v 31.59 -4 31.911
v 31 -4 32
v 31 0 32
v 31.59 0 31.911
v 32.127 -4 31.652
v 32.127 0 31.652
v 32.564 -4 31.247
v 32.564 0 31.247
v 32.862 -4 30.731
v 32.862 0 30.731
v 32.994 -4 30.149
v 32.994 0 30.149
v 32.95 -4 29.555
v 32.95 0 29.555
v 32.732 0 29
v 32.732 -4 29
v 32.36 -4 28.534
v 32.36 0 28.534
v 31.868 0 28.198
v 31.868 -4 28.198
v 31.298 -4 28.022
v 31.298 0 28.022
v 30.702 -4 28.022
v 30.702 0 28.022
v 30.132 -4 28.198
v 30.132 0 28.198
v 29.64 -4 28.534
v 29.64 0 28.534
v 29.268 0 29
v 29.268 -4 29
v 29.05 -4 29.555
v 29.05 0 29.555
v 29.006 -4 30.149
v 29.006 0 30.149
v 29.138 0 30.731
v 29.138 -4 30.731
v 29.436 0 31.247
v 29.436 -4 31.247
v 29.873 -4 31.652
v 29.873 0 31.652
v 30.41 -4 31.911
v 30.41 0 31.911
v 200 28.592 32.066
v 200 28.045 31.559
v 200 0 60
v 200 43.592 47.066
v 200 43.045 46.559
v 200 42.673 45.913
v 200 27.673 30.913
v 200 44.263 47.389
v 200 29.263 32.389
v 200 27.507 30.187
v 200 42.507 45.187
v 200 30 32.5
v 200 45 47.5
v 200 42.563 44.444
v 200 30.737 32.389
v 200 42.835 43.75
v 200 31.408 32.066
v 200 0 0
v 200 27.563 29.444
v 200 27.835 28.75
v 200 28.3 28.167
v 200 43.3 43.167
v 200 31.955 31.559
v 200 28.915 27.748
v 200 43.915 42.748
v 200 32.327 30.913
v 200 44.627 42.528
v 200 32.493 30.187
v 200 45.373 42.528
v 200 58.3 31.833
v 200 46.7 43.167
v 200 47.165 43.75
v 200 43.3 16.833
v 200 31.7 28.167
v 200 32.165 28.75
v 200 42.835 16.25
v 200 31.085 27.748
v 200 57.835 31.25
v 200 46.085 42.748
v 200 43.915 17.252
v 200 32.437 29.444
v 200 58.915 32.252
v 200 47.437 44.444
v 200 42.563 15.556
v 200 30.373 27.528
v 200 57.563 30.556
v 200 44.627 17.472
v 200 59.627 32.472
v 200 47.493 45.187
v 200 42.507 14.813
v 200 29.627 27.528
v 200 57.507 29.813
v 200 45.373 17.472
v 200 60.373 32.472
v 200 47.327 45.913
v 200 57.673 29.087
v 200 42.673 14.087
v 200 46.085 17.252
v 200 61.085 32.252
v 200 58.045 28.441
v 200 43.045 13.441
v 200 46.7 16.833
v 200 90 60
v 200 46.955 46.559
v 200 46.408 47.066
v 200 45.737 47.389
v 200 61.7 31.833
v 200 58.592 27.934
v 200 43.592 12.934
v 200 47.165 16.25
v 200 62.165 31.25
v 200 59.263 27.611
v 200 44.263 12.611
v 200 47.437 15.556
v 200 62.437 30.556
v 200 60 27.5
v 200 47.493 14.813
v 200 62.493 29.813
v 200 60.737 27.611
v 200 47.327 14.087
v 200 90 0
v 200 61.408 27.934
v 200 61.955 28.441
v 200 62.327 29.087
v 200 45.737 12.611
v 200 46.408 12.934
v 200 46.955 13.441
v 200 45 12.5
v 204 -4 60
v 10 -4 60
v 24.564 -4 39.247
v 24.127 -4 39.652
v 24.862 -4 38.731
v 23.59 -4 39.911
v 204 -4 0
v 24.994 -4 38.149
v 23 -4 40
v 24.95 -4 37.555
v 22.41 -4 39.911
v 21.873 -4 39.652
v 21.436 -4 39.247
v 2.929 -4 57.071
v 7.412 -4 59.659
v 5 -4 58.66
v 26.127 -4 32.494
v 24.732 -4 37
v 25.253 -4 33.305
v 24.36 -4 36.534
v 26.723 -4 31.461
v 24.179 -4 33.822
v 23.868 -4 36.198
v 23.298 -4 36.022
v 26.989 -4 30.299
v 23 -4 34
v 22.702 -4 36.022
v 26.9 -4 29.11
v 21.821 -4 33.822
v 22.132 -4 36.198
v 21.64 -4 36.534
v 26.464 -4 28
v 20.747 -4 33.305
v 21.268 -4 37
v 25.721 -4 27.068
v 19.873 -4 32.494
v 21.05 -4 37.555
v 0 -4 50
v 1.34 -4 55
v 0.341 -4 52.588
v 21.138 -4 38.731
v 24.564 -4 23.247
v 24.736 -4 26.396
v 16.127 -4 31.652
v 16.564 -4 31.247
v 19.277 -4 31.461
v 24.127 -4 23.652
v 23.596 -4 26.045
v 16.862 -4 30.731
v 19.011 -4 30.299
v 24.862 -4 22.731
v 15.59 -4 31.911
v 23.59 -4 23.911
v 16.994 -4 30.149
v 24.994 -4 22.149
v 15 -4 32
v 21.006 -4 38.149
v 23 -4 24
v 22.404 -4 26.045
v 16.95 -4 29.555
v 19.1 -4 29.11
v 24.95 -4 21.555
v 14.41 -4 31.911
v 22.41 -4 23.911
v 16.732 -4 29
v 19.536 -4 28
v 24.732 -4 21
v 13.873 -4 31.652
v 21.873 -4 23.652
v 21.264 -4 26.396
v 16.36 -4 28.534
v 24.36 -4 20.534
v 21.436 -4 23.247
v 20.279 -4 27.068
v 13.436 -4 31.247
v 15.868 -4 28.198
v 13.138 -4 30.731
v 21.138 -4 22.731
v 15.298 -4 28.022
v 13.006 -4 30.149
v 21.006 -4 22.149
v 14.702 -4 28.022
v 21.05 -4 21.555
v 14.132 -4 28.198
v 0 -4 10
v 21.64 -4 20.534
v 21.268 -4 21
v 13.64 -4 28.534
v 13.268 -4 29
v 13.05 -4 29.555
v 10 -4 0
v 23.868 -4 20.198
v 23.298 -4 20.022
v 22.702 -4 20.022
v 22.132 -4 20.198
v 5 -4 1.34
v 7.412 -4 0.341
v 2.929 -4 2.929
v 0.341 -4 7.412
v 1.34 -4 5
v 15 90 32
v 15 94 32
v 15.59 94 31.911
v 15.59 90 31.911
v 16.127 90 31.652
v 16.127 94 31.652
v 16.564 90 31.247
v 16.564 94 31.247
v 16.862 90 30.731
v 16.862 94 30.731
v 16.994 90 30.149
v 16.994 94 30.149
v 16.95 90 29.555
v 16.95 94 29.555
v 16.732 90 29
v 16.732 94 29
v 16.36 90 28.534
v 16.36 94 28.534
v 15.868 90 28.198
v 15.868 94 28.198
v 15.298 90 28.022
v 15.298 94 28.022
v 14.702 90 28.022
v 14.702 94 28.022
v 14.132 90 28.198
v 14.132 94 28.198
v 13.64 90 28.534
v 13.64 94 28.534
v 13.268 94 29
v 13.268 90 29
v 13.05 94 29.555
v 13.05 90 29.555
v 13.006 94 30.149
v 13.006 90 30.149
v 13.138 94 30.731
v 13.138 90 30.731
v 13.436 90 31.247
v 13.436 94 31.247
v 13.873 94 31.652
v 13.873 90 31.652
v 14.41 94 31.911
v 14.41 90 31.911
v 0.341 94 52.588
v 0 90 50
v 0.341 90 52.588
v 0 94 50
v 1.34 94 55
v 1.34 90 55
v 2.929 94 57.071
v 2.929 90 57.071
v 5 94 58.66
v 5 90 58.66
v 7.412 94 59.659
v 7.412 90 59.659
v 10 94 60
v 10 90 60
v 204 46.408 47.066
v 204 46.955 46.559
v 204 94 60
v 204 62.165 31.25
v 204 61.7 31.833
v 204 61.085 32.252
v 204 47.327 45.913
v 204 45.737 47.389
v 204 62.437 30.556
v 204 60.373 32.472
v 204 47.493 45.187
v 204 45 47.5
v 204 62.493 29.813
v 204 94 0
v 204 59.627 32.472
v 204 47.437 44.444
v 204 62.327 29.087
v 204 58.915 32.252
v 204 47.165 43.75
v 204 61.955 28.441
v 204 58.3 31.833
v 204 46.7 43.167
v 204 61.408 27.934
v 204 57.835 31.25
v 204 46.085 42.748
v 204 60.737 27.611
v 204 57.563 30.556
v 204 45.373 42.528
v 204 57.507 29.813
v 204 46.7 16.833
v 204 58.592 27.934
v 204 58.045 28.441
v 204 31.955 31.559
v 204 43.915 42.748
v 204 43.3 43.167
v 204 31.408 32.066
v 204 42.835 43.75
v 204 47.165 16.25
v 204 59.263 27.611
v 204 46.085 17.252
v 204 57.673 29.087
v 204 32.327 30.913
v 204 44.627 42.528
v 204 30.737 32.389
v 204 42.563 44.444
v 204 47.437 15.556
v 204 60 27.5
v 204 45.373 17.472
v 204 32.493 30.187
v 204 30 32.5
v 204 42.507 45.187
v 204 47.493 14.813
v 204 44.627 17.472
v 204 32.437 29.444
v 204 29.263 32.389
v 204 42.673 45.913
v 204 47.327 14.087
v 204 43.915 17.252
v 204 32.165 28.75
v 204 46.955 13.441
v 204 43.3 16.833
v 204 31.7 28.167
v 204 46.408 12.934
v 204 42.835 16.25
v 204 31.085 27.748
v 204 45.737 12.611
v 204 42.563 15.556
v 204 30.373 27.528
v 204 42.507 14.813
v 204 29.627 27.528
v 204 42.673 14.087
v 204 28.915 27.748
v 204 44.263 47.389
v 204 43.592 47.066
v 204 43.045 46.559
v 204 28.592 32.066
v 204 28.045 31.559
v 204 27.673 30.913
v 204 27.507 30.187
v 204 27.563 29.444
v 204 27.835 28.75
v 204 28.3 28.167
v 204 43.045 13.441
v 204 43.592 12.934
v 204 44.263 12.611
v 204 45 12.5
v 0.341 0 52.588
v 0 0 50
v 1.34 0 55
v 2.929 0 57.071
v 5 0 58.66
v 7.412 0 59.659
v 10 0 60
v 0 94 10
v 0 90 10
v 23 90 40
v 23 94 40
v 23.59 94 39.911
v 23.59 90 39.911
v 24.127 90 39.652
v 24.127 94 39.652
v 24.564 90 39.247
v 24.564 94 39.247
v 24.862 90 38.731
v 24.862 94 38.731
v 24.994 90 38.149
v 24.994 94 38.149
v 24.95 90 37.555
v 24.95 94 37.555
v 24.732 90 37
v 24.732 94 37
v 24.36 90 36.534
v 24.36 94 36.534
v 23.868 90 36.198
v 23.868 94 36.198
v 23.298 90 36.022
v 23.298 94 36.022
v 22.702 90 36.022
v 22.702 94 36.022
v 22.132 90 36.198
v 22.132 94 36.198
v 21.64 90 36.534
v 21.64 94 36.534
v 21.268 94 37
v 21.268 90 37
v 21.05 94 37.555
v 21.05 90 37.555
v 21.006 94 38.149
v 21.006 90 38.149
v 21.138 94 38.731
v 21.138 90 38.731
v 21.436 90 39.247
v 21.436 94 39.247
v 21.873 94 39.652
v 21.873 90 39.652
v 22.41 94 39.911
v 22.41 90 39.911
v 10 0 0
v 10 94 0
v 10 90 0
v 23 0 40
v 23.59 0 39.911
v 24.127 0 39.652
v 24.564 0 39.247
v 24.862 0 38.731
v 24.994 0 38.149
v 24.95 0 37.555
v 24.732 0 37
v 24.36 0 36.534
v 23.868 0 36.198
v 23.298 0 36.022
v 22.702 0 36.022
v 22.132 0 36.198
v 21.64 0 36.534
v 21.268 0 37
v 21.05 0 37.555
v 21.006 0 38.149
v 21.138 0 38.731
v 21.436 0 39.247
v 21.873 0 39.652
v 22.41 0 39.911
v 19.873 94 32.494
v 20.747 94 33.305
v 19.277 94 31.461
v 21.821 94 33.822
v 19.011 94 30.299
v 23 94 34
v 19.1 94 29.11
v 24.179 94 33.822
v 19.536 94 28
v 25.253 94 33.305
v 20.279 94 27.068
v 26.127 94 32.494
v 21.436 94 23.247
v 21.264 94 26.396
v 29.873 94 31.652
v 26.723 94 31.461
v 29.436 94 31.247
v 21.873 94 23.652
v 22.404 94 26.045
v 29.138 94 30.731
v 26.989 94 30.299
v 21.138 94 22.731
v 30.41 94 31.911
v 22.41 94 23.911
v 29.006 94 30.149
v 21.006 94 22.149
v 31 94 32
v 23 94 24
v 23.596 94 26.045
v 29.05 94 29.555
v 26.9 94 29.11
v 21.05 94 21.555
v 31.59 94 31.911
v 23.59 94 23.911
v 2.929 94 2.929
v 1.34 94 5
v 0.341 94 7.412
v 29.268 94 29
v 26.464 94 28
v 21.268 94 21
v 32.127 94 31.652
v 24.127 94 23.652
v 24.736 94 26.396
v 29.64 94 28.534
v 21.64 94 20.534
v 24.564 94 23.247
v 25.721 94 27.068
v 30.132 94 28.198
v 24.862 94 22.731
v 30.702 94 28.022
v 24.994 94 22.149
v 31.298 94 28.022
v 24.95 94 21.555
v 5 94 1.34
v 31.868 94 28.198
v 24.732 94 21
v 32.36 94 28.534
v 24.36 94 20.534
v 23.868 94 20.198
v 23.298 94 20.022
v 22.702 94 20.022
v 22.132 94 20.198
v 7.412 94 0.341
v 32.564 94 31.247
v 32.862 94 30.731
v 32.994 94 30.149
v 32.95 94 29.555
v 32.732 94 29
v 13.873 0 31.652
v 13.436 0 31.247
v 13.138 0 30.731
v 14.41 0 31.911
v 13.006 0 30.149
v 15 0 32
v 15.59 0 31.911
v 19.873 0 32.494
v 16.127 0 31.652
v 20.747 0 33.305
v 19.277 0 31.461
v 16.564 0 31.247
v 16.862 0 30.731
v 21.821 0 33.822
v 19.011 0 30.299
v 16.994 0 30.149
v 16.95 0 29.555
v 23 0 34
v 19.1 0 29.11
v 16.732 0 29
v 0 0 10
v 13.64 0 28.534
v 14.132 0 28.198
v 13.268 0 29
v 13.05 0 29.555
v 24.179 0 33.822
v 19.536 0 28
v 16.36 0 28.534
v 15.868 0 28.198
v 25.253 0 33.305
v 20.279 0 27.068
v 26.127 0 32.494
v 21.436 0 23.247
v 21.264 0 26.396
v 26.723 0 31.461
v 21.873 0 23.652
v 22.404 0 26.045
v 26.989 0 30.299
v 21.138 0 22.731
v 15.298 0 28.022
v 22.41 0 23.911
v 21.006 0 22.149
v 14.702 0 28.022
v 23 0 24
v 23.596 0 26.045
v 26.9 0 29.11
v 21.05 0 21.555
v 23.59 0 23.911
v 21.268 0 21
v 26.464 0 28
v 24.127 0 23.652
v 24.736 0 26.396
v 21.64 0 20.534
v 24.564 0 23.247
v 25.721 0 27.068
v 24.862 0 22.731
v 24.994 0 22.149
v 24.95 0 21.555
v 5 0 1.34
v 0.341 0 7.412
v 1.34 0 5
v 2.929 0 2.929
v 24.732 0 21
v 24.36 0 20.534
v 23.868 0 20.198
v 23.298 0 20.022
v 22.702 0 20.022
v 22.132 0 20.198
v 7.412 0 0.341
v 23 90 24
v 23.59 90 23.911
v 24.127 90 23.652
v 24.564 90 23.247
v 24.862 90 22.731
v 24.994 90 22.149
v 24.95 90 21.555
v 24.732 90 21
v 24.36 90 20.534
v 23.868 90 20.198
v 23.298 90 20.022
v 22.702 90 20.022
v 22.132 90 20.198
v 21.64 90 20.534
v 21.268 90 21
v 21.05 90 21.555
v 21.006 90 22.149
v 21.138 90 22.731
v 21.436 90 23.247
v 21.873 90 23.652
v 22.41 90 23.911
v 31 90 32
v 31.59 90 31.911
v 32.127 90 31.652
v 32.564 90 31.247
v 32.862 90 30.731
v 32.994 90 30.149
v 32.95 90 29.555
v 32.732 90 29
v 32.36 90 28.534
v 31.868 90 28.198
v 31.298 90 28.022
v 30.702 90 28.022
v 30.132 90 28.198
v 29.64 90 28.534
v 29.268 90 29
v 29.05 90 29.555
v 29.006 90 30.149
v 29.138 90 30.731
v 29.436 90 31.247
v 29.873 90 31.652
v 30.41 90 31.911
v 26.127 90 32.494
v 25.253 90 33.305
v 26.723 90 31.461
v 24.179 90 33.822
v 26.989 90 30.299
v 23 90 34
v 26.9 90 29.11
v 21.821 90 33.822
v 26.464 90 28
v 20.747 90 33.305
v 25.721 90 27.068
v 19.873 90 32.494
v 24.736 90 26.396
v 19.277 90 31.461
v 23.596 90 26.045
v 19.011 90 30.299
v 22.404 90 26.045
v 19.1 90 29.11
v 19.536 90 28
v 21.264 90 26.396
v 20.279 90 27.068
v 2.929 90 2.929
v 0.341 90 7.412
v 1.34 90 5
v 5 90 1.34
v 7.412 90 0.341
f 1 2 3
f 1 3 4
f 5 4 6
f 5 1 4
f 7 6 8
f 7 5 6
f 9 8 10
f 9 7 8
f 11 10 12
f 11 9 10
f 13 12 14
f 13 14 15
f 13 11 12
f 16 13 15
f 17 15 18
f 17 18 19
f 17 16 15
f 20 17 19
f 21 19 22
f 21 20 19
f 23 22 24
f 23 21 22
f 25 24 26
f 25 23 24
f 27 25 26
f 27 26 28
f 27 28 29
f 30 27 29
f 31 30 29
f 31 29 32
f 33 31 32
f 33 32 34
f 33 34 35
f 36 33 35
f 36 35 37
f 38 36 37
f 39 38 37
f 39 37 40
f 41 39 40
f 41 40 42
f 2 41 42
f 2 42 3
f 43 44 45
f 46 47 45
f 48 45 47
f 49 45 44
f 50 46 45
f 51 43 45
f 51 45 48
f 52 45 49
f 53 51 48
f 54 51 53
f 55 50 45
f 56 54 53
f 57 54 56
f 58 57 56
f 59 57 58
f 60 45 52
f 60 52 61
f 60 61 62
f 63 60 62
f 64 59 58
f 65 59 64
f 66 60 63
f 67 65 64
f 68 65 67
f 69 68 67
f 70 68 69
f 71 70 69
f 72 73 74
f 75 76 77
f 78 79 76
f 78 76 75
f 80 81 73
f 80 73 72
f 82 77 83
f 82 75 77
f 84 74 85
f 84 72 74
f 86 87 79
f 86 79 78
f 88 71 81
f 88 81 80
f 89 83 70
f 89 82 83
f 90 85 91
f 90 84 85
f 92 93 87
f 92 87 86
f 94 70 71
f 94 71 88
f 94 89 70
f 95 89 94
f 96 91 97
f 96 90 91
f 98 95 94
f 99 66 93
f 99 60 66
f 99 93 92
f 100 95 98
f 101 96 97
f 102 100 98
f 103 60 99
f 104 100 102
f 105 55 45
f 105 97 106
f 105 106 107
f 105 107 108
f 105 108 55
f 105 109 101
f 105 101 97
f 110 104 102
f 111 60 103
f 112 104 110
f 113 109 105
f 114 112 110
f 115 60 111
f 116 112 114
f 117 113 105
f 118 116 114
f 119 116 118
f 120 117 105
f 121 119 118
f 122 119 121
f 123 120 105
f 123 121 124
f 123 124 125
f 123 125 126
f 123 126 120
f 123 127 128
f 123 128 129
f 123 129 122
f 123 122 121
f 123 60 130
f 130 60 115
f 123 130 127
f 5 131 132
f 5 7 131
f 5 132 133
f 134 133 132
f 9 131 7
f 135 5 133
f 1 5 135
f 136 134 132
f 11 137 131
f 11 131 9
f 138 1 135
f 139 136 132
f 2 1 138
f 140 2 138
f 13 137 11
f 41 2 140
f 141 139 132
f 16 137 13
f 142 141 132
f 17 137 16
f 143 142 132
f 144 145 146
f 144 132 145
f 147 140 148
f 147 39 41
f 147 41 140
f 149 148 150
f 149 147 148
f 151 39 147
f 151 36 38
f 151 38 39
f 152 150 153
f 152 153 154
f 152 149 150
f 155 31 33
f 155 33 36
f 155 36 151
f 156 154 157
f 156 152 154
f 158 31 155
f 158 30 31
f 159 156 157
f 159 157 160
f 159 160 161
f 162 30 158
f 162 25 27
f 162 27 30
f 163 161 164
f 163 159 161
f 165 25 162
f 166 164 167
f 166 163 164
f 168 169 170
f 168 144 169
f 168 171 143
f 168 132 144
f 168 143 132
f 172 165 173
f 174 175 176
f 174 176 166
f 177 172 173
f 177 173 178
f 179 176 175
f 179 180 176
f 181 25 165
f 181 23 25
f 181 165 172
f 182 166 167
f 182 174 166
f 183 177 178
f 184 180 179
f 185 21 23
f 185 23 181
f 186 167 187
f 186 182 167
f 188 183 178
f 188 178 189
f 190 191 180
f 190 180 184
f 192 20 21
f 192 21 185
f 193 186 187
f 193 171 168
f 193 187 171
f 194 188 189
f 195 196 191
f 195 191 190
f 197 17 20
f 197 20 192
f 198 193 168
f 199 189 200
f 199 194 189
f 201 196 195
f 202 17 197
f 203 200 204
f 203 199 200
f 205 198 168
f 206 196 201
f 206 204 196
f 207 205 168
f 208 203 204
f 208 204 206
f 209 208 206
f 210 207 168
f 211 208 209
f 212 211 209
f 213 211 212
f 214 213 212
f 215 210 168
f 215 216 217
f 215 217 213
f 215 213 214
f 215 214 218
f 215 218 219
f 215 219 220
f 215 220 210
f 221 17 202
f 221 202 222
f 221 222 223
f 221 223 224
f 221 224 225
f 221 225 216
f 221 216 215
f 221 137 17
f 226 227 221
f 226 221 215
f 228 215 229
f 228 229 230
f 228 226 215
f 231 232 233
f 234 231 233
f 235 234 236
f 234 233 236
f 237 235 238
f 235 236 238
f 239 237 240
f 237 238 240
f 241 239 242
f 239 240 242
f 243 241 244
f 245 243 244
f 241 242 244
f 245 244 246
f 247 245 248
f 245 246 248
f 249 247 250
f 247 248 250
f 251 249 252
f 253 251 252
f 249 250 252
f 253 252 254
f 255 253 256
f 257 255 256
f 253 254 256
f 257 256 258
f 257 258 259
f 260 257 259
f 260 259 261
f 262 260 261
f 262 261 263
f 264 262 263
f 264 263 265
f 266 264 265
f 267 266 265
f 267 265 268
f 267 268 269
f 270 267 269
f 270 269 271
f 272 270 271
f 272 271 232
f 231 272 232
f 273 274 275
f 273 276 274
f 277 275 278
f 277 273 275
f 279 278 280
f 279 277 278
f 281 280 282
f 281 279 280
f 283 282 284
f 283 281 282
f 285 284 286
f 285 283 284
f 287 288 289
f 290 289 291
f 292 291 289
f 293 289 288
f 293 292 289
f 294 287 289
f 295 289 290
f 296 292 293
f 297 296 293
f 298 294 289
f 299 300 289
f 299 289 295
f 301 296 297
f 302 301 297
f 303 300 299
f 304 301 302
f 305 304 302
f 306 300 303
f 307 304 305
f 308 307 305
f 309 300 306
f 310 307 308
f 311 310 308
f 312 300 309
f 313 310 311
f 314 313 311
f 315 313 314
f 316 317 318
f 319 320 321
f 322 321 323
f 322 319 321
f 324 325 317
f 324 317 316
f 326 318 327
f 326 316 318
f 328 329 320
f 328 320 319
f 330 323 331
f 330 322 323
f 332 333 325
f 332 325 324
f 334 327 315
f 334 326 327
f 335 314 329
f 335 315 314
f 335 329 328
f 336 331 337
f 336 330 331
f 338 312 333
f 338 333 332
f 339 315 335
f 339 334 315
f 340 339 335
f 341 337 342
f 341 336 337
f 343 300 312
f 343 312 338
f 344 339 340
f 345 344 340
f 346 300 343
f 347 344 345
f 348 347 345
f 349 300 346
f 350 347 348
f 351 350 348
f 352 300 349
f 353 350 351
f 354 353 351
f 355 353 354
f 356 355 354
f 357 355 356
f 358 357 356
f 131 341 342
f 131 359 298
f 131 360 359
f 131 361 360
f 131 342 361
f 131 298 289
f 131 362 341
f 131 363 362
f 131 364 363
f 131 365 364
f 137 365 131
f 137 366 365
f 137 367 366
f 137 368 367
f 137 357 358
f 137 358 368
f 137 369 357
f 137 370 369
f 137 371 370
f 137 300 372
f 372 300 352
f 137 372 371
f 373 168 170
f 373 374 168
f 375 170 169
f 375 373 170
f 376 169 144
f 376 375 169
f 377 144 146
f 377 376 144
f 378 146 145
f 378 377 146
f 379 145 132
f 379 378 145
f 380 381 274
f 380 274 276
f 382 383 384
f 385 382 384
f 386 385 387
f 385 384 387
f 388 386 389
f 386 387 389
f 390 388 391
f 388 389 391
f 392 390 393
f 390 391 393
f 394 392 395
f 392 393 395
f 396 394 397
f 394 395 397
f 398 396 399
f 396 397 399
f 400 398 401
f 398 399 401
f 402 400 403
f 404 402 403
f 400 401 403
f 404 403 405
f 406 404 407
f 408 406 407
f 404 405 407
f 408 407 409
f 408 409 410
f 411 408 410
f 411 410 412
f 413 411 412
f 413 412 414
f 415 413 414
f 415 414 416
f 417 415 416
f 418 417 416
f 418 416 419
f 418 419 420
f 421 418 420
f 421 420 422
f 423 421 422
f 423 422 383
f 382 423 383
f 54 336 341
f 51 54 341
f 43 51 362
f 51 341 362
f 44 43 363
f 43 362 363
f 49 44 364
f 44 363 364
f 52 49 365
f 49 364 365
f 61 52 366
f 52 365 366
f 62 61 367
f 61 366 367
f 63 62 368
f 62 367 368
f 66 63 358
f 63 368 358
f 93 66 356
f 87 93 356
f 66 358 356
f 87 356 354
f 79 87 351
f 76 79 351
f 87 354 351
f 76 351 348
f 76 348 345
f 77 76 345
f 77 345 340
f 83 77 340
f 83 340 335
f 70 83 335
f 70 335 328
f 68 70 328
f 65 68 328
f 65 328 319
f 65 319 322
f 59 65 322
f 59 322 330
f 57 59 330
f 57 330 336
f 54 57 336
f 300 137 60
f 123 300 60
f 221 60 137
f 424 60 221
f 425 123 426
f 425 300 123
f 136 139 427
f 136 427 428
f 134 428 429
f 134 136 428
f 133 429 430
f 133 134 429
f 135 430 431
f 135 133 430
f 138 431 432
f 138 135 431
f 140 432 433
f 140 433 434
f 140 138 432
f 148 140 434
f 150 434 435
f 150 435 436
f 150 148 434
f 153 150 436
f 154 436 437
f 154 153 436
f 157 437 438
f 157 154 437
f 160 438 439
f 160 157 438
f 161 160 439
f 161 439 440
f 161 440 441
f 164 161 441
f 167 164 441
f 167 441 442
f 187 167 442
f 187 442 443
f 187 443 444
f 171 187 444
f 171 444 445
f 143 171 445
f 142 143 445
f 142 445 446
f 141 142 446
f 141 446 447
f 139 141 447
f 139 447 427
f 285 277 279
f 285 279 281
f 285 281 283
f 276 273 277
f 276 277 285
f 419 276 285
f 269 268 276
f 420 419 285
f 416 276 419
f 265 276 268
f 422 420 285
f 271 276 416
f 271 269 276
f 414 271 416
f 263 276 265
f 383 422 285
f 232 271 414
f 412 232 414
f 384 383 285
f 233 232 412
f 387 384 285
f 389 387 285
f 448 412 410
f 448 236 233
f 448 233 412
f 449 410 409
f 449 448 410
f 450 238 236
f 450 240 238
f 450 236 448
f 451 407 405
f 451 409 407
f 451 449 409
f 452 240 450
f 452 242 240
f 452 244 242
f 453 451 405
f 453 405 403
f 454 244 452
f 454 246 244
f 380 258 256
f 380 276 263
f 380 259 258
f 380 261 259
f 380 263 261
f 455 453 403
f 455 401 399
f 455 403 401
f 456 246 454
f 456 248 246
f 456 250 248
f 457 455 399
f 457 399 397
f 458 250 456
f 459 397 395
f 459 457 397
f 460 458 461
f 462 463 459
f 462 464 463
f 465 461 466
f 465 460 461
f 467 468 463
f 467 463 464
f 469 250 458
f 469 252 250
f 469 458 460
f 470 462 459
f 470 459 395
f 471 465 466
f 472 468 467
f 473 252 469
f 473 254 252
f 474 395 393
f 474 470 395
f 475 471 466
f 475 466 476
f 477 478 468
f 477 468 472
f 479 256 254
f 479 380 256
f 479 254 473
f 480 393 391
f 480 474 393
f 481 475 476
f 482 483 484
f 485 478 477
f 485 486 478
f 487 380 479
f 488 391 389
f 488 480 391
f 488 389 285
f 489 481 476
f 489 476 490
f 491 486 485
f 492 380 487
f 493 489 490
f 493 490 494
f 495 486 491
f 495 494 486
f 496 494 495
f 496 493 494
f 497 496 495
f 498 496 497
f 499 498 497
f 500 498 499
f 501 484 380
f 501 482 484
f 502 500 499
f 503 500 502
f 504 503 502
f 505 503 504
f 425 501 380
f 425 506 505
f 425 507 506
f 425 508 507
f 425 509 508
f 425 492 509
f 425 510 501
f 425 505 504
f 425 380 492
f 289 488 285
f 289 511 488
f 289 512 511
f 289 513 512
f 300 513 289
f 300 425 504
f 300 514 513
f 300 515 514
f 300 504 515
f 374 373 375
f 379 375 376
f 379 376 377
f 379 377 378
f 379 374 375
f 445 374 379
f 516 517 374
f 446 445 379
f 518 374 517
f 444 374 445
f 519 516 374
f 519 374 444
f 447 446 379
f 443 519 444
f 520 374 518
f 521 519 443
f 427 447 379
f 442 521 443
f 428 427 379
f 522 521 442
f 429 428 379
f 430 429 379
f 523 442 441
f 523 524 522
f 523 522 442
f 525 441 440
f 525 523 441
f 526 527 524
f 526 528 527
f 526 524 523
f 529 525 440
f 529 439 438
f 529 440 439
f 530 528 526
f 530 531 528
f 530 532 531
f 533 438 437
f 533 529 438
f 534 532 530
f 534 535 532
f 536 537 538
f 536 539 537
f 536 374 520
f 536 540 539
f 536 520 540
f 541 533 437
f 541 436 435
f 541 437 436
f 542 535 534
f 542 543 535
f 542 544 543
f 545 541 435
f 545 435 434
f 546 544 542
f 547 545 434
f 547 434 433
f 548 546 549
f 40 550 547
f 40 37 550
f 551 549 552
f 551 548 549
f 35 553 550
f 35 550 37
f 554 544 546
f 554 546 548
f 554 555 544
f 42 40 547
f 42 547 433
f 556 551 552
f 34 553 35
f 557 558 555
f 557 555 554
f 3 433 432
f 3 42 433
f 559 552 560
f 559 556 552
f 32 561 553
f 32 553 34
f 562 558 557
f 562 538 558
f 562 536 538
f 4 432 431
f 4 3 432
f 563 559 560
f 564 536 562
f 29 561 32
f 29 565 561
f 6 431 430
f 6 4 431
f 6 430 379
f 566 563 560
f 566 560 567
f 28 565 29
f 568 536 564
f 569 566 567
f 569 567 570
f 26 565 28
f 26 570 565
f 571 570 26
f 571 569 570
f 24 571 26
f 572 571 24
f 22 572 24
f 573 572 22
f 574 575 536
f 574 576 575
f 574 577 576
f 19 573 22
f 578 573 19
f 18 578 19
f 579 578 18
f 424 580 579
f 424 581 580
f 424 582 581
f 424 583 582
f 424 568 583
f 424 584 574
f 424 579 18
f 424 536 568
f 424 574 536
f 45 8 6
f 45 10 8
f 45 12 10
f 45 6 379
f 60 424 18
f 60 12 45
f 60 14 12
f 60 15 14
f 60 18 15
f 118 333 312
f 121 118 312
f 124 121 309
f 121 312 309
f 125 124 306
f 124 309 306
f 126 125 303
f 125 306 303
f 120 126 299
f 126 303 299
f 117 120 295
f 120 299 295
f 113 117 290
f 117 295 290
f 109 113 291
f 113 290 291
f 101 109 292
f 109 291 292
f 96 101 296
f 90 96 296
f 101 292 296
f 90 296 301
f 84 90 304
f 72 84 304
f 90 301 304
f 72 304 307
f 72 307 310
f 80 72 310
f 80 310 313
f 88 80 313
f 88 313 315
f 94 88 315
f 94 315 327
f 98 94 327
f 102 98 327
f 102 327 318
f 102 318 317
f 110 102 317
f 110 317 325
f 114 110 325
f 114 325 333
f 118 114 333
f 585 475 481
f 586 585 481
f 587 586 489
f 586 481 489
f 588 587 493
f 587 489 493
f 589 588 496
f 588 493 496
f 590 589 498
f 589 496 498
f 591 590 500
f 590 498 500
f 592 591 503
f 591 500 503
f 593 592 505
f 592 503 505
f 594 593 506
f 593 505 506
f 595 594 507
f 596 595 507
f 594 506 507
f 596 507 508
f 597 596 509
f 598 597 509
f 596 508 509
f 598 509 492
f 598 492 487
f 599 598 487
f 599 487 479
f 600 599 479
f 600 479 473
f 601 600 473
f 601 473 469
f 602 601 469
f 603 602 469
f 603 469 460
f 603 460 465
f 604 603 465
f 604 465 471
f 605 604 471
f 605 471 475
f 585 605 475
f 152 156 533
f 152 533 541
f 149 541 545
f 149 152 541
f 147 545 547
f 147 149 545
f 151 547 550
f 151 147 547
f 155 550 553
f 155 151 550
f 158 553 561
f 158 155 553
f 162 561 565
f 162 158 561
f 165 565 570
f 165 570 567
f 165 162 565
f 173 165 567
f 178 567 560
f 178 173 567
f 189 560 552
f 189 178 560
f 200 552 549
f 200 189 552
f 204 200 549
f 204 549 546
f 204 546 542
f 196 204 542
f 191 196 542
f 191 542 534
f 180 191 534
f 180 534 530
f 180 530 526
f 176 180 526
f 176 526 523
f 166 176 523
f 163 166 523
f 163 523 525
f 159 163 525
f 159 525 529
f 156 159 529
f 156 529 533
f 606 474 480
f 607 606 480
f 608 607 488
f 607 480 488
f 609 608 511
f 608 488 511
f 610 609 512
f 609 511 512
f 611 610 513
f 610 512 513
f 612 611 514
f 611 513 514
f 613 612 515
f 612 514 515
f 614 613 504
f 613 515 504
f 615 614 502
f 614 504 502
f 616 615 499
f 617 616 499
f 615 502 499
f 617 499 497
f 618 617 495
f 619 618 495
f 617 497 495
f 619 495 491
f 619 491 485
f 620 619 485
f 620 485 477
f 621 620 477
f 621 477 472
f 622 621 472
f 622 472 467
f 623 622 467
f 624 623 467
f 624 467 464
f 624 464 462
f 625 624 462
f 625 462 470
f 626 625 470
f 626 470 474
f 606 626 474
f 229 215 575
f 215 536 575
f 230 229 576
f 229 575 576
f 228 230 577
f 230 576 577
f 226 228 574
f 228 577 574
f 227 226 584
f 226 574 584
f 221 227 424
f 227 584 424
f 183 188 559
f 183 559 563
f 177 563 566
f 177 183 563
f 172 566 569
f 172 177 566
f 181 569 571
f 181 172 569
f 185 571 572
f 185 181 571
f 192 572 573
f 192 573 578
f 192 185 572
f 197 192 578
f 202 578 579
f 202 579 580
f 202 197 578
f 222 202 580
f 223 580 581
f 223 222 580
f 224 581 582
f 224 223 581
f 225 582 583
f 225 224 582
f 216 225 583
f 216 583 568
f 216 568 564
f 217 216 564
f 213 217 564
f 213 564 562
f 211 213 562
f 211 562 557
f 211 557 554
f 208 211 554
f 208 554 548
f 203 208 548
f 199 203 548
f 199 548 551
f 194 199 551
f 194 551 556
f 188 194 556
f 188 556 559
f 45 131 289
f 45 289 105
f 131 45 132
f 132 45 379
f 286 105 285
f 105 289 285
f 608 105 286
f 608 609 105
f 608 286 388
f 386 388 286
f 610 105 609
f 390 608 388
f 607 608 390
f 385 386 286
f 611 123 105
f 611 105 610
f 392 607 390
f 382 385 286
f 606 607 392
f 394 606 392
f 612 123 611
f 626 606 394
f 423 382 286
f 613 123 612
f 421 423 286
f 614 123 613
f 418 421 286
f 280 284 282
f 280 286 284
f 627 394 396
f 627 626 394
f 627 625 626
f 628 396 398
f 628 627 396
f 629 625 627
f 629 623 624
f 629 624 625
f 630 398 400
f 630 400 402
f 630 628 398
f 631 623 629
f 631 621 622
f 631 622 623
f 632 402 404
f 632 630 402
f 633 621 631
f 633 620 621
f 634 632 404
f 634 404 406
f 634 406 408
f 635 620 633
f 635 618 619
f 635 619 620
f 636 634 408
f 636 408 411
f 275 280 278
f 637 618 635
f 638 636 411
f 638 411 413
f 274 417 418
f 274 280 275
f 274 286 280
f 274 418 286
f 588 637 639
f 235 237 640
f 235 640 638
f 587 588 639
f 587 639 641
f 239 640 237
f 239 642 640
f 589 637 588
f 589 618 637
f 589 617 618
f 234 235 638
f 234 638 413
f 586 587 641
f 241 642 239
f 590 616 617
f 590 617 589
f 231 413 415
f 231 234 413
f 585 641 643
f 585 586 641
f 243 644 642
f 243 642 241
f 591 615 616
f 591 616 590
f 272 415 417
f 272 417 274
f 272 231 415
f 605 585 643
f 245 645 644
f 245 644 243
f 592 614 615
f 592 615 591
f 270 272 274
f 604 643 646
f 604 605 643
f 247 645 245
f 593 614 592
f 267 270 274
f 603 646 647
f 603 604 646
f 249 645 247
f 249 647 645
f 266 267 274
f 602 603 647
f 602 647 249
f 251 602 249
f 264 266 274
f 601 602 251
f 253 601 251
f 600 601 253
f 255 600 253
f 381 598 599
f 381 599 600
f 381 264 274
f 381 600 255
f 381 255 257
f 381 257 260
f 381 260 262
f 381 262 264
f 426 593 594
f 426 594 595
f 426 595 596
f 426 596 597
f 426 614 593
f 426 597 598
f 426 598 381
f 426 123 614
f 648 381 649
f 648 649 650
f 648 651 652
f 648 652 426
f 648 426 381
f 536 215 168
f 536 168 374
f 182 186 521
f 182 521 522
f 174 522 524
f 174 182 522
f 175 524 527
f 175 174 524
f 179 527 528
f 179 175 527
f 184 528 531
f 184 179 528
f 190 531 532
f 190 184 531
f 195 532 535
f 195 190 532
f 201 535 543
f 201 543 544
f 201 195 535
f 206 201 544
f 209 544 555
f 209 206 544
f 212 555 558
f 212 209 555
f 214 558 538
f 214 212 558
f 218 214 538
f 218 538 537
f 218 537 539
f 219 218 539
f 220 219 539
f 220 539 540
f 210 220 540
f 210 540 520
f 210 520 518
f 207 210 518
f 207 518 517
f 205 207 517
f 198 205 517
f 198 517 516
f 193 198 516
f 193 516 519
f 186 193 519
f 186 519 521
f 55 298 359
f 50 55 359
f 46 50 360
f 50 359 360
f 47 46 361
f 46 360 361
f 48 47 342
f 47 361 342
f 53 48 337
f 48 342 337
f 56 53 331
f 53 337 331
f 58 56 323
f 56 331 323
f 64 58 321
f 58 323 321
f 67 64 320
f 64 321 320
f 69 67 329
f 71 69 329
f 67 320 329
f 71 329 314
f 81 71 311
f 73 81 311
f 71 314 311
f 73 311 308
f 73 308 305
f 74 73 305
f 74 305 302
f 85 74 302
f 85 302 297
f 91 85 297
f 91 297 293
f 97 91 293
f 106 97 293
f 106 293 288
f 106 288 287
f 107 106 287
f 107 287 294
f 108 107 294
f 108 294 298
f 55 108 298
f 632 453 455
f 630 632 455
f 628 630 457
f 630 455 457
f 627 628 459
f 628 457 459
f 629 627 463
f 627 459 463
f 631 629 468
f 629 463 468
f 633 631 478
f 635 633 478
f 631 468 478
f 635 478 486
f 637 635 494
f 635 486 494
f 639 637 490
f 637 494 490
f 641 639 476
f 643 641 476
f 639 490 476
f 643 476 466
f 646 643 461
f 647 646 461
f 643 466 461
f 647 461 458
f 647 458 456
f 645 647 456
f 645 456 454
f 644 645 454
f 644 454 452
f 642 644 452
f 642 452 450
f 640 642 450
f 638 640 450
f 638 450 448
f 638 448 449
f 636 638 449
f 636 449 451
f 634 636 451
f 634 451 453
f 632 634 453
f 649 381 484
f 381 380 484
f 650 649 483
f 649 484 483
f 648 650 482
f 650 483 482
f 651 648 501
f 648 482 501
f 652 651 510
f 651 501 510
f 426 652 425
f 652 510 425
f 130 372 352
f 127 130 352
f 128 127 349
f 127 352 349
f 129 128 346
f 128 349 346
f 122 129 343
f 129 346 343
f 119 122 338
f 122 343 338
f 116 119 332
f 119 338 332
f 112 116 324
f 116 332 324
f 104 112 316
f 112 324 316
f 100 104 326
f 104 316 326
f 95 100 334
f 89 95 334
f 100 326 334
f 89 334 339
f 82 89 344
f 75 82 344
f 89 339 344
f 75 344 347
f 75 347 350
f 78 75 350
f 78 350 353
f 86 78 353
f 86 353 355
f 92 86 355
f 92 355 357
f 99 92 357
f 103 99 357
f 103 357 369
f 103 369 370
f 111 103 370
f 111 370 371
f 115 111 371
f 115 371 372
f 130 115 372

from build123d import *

# Parameters (mm, degrees)
EKSTR_ZYON_NCE1_DEPTH = 60
RADYUS1_R             = 10
KES_EKSTR_ZYON1_REACH = 236.137
IZIM2_R               = 4
IZIM2_R_2             = 2
KES_EKSTR_ZYON2_REACH = 234.491
IZIM3_R               = 2.5


with BuildPart() as part:
    # Çizim1 → Ekstrüzyon-İnce1 (new body)
    with BuildSketch(Plane.XY):
        Polygon((0, 0), (200, 0), (200, 90), (0, 90), (0, 94), (204, 94), (204, -4), (0, -4), align=None)
    extrude(amount=EKSTR_ZYON_NCE1_DEPTH)

    # Radyus1
    radyus1_edges = [part.edges().sort_by_distance(p)[0] for p in [
        (0, -2, 60),
        (0, 92, 60),
        (0, -2, 0),
        (0, 92, 0),
    ]]
    fillet(radyus1_edges, radius=RADYUS1_R)

    # Çizim2 → Kes-Ekstrüzyon1 (cut, up to next)
    with BuildSketch(Plane(origin=(0, 94, 0), x_dir=(1, 0, 0), z_dir=(0, 1, 0)), mode=Mode.PRIVATE) as kes_ekstr_zyon1_sk1:
        with Locations(Location((23, -30, 0), (0, 0, 270))):
            Circle(IZIM2_R)
    kes_ekstr_zyon1_tool1 = extrude(kes_ekstr_zyon1_sk1.sketch, amount=-KES_EKSTR_ZYON1_REACH, mode=Mode.PRIVATE) & part.part
    # Çizim2 → Kes-Ekstrüzyon1 (cut, up to next)
    with BuildSketch(Plane(origin=(0, 94, 0), x_dir=(1, 0, 0), z_dir=(0, 1, 0)), mode=Mode.PRIVATE) as kes_ekstr_zyon1_sk2:
        with Locations(Location((23, -22, 0), (0, 0, 270))):
            Circle(IZIM2_R_2)
    kes_ekstr_zyon1_tool2 = extrude(kes_ekstr_zyon1_sk2.sketch, amount=-KES_EKSTR_ZYON1_REACH, mode=Mode.PRIVATE) & part.part
    # Çizim2 → Kes-Ekstrüzyon1 (cut, up to next)
    with BuildSketch(Plane(origin=(0, 94, 0), x_dir=(1, 0, 0), z_dir=(0, 1, 0)), mode=Mode.PRIVATE) as kes_ekstr_zyon1_sk3:
        with Locations(Location((23, -38, 0), (0, 0, 270))):
            Circle(IZIM2_R_2)
    kes_ekstr_zyon1_tool3 = extrude(kes_ekstr_zyon1_sk3.sketch, amount=-KES_EKSTR_ZYON1_REACH, mode=Mode.PRIVATE) & part.part
    # Çizim2 → Kes-Ekstrüzyon1 (cut, up to next)
    with BuildSketch(Plane(origin=(0, 94, 0), x_dir=(1, 0, 0), z_dir=(0, 1, 0)), mode=Mode.PRIVATE) as kes_ekstr_zyon1_sk4:
        with Locations(Location((31, -30, 0), (0, 0, 270))):
            Circle(IZIM2_R_2)
    kes_ekstr_zyon1_tool4 = extrude(kes_ekstr_zyon1_sk4.sketch, amount=-KES_EKSTR_ZYON1_REACH, mode=Mode.PRIVATE) & part.part
    # Çizim2 → Kes-Ekstrüzyon1 (cut, up to next)
    with BuildSketch(Plane(origin=(0, 94, 0), x_dir=(1, 0, 0), z_dir=(0, 1, 0)), mode=Mode.PRIVATE) as kes_ekstr_zyon1_sk5:
        with Locations(Location((15, -30, 0), (0, 0, 270))):
            Circle(IZIM2_R_2)
    kes_ekstr_zyon1_tool5 = extrude(kes_ekstr_zyon1_sk5.sketch, amount=-KES_EKSTR_ZYON1_REACH, mode=Mode.PRIVATE) & part.part
    kes_ekstr_zyon1_1 = kes_ekstr_zyon1_tool1.solids().sort_by_distance((23, 94, 30))[0]
    add(kes_ekstr_zyon1_1, mode=Mode.SUBTRACT)
    kes_ekstr_zyon1_2 = kes_ekstr_zyon1_tool2.solids().sort_by_distance((23, 94, 22))[0]
    add(kes_ekstr_zyon1_2, mode=Mode.SUBTRACT)
    kes_ekstr_zyon1_3 = kes_ekstr_zyon1_tool3.solids().sort_by_distance((23, 94, 38))[0]
    add(kes_ekstr_zyon1_3, mode=Mode.SUBTRACT)
    kes_ekstr_zyon1_4 = kes_ekstr_zyon1_tool4.solids().sort_by_distance((31, 94, 30))[0]
    add(kes_ekstr_zyon1_4, mode=Mode.SUBTRACT)
    kes_ekstr_zyon1_5 = kes_ekstr_zyon1_tool5.solids().sort_by_distance((15, 94, 30))[0]
    add(kes_ekstr_zyon1_5, mode=Mode.SUBTRACT)
    kes_ekstr_zyon1 = kes_ekstr_zyon1_1 + kes_ekstr_zyon1_2 + kes_ekstr_zyon1_3 + kes_ekstr_zyon1_4 + kes_ekstr_zyon1_5  # Kes-Ekstrüzyon1 as one shape, for the pattern or mirror that repeats it

    # Aynalama1: Kes-Ekstrüzyon1 across plane
    add(kes_ekstr_zyon1.mirror(Plane.ZX.offset(45)), mode=Mode.SUBTRACT)

    # Çizim3 → Kes-Ekstrüzyon2 (cut, up to next)
    with BuildSketch(Plane(origin=(204, 0, 0), x_dir=(0, 0, -1), z_dir=(1, 0, 0)), mode=Mode.PRIVATE) as kes_ekstr_zyon2_sk1:
        with Locations((-30, 60)):
            Circle(IZIM3_R)
    kes_ekstr_zyon2_tool1 = extrude(kes_ekstr_zyon2_sk1.sketch, amount=-KES_EKSTR_ZYON2_REACH, mode=Mode.PRIVATE) & part.part
    # Çizim3 → Kes-Ekstrüzyon2 (cut, up to next)
    with BuildSketch(Plane(origin=(204, 0, 0), x_dir=(0, 0, -1), z_dir=(1, 0, 0)), mode=Mode.PRIVATE) as kes_ekstr_zyon2_sk2:
        with Locations(Location((-30, 30, 0), (0, 0, 180))):
            Circle(IZIM3_R)
    kes_ekstr_zyon2_tool2 = extrude(kes_ekstr_zyon2_sk2.sketch, amount=-KES_EKSTR_ZYON2_REACH, mode=Mode.PRIVATE) & part.part
    # Çizim3 → Kes-Ekstrüzyon2 (cut, up to next)
    with BuildSketch(Plane(origin=(204, 0, 0), x_dir=(0, 0, -1), z_dir=(1, 0, 0)), mode=Mode.PRIVATE) as kes_ekstr_zyon2_sk3:
        with Locations((-15, 45)):
            Circle(IZIM3_R)
    kes_ekstr_zyon2_tool3 = extrude(kes_ekstr_zyon2_sk3.sketch, amount=-KES_EKSTR_ZYON2_REACH, mode=Mode.PRIVATE) & part.part
    # Çizim3 → Kes-Ekstrüzyon2 (cut, up to next)
    with BuildSketch(Plane(origin=(204, 0, 0), x_dir=(0, 0, -1), z_dir=(1, 0, 0)), mode=Mode.PRIVATE) as kes_ekstr_zyon2_sk4:
        with Locations(Location((-45, 45, 0), (0, 0, 180))):
            Circle(IZIM3_R)
    kes_ekstr_zyon2_tool4 = extrude(kes_ekstr_zyon2_sk4.sketch, amount=-KES_EKSTR_ZYON2_REACH, mode=Mode.PRIVATE) & part.part
    add(kes_ekstr_zyon2_tool1.solids().sort_by_distance((204, 60, 30))[0], mode=Mode.SUBTRACT)
    add(kes_ekstr_zyon2_tool2.solids().sort_by_distance((204, 30, 30))[0], mode=Mode.SUBTRACT)
    add(kes_ekstr_zyon2_tool3.solids().sort_by_distance((204, 45, 15))[0], mode=Mode.SUBTRACT)
    add(kes_ekstr_zyon2_tool4.solids().sort_by_distance((204, 45, 45))[0], mode=Mode.SUBTRACT)


solid = part.part
